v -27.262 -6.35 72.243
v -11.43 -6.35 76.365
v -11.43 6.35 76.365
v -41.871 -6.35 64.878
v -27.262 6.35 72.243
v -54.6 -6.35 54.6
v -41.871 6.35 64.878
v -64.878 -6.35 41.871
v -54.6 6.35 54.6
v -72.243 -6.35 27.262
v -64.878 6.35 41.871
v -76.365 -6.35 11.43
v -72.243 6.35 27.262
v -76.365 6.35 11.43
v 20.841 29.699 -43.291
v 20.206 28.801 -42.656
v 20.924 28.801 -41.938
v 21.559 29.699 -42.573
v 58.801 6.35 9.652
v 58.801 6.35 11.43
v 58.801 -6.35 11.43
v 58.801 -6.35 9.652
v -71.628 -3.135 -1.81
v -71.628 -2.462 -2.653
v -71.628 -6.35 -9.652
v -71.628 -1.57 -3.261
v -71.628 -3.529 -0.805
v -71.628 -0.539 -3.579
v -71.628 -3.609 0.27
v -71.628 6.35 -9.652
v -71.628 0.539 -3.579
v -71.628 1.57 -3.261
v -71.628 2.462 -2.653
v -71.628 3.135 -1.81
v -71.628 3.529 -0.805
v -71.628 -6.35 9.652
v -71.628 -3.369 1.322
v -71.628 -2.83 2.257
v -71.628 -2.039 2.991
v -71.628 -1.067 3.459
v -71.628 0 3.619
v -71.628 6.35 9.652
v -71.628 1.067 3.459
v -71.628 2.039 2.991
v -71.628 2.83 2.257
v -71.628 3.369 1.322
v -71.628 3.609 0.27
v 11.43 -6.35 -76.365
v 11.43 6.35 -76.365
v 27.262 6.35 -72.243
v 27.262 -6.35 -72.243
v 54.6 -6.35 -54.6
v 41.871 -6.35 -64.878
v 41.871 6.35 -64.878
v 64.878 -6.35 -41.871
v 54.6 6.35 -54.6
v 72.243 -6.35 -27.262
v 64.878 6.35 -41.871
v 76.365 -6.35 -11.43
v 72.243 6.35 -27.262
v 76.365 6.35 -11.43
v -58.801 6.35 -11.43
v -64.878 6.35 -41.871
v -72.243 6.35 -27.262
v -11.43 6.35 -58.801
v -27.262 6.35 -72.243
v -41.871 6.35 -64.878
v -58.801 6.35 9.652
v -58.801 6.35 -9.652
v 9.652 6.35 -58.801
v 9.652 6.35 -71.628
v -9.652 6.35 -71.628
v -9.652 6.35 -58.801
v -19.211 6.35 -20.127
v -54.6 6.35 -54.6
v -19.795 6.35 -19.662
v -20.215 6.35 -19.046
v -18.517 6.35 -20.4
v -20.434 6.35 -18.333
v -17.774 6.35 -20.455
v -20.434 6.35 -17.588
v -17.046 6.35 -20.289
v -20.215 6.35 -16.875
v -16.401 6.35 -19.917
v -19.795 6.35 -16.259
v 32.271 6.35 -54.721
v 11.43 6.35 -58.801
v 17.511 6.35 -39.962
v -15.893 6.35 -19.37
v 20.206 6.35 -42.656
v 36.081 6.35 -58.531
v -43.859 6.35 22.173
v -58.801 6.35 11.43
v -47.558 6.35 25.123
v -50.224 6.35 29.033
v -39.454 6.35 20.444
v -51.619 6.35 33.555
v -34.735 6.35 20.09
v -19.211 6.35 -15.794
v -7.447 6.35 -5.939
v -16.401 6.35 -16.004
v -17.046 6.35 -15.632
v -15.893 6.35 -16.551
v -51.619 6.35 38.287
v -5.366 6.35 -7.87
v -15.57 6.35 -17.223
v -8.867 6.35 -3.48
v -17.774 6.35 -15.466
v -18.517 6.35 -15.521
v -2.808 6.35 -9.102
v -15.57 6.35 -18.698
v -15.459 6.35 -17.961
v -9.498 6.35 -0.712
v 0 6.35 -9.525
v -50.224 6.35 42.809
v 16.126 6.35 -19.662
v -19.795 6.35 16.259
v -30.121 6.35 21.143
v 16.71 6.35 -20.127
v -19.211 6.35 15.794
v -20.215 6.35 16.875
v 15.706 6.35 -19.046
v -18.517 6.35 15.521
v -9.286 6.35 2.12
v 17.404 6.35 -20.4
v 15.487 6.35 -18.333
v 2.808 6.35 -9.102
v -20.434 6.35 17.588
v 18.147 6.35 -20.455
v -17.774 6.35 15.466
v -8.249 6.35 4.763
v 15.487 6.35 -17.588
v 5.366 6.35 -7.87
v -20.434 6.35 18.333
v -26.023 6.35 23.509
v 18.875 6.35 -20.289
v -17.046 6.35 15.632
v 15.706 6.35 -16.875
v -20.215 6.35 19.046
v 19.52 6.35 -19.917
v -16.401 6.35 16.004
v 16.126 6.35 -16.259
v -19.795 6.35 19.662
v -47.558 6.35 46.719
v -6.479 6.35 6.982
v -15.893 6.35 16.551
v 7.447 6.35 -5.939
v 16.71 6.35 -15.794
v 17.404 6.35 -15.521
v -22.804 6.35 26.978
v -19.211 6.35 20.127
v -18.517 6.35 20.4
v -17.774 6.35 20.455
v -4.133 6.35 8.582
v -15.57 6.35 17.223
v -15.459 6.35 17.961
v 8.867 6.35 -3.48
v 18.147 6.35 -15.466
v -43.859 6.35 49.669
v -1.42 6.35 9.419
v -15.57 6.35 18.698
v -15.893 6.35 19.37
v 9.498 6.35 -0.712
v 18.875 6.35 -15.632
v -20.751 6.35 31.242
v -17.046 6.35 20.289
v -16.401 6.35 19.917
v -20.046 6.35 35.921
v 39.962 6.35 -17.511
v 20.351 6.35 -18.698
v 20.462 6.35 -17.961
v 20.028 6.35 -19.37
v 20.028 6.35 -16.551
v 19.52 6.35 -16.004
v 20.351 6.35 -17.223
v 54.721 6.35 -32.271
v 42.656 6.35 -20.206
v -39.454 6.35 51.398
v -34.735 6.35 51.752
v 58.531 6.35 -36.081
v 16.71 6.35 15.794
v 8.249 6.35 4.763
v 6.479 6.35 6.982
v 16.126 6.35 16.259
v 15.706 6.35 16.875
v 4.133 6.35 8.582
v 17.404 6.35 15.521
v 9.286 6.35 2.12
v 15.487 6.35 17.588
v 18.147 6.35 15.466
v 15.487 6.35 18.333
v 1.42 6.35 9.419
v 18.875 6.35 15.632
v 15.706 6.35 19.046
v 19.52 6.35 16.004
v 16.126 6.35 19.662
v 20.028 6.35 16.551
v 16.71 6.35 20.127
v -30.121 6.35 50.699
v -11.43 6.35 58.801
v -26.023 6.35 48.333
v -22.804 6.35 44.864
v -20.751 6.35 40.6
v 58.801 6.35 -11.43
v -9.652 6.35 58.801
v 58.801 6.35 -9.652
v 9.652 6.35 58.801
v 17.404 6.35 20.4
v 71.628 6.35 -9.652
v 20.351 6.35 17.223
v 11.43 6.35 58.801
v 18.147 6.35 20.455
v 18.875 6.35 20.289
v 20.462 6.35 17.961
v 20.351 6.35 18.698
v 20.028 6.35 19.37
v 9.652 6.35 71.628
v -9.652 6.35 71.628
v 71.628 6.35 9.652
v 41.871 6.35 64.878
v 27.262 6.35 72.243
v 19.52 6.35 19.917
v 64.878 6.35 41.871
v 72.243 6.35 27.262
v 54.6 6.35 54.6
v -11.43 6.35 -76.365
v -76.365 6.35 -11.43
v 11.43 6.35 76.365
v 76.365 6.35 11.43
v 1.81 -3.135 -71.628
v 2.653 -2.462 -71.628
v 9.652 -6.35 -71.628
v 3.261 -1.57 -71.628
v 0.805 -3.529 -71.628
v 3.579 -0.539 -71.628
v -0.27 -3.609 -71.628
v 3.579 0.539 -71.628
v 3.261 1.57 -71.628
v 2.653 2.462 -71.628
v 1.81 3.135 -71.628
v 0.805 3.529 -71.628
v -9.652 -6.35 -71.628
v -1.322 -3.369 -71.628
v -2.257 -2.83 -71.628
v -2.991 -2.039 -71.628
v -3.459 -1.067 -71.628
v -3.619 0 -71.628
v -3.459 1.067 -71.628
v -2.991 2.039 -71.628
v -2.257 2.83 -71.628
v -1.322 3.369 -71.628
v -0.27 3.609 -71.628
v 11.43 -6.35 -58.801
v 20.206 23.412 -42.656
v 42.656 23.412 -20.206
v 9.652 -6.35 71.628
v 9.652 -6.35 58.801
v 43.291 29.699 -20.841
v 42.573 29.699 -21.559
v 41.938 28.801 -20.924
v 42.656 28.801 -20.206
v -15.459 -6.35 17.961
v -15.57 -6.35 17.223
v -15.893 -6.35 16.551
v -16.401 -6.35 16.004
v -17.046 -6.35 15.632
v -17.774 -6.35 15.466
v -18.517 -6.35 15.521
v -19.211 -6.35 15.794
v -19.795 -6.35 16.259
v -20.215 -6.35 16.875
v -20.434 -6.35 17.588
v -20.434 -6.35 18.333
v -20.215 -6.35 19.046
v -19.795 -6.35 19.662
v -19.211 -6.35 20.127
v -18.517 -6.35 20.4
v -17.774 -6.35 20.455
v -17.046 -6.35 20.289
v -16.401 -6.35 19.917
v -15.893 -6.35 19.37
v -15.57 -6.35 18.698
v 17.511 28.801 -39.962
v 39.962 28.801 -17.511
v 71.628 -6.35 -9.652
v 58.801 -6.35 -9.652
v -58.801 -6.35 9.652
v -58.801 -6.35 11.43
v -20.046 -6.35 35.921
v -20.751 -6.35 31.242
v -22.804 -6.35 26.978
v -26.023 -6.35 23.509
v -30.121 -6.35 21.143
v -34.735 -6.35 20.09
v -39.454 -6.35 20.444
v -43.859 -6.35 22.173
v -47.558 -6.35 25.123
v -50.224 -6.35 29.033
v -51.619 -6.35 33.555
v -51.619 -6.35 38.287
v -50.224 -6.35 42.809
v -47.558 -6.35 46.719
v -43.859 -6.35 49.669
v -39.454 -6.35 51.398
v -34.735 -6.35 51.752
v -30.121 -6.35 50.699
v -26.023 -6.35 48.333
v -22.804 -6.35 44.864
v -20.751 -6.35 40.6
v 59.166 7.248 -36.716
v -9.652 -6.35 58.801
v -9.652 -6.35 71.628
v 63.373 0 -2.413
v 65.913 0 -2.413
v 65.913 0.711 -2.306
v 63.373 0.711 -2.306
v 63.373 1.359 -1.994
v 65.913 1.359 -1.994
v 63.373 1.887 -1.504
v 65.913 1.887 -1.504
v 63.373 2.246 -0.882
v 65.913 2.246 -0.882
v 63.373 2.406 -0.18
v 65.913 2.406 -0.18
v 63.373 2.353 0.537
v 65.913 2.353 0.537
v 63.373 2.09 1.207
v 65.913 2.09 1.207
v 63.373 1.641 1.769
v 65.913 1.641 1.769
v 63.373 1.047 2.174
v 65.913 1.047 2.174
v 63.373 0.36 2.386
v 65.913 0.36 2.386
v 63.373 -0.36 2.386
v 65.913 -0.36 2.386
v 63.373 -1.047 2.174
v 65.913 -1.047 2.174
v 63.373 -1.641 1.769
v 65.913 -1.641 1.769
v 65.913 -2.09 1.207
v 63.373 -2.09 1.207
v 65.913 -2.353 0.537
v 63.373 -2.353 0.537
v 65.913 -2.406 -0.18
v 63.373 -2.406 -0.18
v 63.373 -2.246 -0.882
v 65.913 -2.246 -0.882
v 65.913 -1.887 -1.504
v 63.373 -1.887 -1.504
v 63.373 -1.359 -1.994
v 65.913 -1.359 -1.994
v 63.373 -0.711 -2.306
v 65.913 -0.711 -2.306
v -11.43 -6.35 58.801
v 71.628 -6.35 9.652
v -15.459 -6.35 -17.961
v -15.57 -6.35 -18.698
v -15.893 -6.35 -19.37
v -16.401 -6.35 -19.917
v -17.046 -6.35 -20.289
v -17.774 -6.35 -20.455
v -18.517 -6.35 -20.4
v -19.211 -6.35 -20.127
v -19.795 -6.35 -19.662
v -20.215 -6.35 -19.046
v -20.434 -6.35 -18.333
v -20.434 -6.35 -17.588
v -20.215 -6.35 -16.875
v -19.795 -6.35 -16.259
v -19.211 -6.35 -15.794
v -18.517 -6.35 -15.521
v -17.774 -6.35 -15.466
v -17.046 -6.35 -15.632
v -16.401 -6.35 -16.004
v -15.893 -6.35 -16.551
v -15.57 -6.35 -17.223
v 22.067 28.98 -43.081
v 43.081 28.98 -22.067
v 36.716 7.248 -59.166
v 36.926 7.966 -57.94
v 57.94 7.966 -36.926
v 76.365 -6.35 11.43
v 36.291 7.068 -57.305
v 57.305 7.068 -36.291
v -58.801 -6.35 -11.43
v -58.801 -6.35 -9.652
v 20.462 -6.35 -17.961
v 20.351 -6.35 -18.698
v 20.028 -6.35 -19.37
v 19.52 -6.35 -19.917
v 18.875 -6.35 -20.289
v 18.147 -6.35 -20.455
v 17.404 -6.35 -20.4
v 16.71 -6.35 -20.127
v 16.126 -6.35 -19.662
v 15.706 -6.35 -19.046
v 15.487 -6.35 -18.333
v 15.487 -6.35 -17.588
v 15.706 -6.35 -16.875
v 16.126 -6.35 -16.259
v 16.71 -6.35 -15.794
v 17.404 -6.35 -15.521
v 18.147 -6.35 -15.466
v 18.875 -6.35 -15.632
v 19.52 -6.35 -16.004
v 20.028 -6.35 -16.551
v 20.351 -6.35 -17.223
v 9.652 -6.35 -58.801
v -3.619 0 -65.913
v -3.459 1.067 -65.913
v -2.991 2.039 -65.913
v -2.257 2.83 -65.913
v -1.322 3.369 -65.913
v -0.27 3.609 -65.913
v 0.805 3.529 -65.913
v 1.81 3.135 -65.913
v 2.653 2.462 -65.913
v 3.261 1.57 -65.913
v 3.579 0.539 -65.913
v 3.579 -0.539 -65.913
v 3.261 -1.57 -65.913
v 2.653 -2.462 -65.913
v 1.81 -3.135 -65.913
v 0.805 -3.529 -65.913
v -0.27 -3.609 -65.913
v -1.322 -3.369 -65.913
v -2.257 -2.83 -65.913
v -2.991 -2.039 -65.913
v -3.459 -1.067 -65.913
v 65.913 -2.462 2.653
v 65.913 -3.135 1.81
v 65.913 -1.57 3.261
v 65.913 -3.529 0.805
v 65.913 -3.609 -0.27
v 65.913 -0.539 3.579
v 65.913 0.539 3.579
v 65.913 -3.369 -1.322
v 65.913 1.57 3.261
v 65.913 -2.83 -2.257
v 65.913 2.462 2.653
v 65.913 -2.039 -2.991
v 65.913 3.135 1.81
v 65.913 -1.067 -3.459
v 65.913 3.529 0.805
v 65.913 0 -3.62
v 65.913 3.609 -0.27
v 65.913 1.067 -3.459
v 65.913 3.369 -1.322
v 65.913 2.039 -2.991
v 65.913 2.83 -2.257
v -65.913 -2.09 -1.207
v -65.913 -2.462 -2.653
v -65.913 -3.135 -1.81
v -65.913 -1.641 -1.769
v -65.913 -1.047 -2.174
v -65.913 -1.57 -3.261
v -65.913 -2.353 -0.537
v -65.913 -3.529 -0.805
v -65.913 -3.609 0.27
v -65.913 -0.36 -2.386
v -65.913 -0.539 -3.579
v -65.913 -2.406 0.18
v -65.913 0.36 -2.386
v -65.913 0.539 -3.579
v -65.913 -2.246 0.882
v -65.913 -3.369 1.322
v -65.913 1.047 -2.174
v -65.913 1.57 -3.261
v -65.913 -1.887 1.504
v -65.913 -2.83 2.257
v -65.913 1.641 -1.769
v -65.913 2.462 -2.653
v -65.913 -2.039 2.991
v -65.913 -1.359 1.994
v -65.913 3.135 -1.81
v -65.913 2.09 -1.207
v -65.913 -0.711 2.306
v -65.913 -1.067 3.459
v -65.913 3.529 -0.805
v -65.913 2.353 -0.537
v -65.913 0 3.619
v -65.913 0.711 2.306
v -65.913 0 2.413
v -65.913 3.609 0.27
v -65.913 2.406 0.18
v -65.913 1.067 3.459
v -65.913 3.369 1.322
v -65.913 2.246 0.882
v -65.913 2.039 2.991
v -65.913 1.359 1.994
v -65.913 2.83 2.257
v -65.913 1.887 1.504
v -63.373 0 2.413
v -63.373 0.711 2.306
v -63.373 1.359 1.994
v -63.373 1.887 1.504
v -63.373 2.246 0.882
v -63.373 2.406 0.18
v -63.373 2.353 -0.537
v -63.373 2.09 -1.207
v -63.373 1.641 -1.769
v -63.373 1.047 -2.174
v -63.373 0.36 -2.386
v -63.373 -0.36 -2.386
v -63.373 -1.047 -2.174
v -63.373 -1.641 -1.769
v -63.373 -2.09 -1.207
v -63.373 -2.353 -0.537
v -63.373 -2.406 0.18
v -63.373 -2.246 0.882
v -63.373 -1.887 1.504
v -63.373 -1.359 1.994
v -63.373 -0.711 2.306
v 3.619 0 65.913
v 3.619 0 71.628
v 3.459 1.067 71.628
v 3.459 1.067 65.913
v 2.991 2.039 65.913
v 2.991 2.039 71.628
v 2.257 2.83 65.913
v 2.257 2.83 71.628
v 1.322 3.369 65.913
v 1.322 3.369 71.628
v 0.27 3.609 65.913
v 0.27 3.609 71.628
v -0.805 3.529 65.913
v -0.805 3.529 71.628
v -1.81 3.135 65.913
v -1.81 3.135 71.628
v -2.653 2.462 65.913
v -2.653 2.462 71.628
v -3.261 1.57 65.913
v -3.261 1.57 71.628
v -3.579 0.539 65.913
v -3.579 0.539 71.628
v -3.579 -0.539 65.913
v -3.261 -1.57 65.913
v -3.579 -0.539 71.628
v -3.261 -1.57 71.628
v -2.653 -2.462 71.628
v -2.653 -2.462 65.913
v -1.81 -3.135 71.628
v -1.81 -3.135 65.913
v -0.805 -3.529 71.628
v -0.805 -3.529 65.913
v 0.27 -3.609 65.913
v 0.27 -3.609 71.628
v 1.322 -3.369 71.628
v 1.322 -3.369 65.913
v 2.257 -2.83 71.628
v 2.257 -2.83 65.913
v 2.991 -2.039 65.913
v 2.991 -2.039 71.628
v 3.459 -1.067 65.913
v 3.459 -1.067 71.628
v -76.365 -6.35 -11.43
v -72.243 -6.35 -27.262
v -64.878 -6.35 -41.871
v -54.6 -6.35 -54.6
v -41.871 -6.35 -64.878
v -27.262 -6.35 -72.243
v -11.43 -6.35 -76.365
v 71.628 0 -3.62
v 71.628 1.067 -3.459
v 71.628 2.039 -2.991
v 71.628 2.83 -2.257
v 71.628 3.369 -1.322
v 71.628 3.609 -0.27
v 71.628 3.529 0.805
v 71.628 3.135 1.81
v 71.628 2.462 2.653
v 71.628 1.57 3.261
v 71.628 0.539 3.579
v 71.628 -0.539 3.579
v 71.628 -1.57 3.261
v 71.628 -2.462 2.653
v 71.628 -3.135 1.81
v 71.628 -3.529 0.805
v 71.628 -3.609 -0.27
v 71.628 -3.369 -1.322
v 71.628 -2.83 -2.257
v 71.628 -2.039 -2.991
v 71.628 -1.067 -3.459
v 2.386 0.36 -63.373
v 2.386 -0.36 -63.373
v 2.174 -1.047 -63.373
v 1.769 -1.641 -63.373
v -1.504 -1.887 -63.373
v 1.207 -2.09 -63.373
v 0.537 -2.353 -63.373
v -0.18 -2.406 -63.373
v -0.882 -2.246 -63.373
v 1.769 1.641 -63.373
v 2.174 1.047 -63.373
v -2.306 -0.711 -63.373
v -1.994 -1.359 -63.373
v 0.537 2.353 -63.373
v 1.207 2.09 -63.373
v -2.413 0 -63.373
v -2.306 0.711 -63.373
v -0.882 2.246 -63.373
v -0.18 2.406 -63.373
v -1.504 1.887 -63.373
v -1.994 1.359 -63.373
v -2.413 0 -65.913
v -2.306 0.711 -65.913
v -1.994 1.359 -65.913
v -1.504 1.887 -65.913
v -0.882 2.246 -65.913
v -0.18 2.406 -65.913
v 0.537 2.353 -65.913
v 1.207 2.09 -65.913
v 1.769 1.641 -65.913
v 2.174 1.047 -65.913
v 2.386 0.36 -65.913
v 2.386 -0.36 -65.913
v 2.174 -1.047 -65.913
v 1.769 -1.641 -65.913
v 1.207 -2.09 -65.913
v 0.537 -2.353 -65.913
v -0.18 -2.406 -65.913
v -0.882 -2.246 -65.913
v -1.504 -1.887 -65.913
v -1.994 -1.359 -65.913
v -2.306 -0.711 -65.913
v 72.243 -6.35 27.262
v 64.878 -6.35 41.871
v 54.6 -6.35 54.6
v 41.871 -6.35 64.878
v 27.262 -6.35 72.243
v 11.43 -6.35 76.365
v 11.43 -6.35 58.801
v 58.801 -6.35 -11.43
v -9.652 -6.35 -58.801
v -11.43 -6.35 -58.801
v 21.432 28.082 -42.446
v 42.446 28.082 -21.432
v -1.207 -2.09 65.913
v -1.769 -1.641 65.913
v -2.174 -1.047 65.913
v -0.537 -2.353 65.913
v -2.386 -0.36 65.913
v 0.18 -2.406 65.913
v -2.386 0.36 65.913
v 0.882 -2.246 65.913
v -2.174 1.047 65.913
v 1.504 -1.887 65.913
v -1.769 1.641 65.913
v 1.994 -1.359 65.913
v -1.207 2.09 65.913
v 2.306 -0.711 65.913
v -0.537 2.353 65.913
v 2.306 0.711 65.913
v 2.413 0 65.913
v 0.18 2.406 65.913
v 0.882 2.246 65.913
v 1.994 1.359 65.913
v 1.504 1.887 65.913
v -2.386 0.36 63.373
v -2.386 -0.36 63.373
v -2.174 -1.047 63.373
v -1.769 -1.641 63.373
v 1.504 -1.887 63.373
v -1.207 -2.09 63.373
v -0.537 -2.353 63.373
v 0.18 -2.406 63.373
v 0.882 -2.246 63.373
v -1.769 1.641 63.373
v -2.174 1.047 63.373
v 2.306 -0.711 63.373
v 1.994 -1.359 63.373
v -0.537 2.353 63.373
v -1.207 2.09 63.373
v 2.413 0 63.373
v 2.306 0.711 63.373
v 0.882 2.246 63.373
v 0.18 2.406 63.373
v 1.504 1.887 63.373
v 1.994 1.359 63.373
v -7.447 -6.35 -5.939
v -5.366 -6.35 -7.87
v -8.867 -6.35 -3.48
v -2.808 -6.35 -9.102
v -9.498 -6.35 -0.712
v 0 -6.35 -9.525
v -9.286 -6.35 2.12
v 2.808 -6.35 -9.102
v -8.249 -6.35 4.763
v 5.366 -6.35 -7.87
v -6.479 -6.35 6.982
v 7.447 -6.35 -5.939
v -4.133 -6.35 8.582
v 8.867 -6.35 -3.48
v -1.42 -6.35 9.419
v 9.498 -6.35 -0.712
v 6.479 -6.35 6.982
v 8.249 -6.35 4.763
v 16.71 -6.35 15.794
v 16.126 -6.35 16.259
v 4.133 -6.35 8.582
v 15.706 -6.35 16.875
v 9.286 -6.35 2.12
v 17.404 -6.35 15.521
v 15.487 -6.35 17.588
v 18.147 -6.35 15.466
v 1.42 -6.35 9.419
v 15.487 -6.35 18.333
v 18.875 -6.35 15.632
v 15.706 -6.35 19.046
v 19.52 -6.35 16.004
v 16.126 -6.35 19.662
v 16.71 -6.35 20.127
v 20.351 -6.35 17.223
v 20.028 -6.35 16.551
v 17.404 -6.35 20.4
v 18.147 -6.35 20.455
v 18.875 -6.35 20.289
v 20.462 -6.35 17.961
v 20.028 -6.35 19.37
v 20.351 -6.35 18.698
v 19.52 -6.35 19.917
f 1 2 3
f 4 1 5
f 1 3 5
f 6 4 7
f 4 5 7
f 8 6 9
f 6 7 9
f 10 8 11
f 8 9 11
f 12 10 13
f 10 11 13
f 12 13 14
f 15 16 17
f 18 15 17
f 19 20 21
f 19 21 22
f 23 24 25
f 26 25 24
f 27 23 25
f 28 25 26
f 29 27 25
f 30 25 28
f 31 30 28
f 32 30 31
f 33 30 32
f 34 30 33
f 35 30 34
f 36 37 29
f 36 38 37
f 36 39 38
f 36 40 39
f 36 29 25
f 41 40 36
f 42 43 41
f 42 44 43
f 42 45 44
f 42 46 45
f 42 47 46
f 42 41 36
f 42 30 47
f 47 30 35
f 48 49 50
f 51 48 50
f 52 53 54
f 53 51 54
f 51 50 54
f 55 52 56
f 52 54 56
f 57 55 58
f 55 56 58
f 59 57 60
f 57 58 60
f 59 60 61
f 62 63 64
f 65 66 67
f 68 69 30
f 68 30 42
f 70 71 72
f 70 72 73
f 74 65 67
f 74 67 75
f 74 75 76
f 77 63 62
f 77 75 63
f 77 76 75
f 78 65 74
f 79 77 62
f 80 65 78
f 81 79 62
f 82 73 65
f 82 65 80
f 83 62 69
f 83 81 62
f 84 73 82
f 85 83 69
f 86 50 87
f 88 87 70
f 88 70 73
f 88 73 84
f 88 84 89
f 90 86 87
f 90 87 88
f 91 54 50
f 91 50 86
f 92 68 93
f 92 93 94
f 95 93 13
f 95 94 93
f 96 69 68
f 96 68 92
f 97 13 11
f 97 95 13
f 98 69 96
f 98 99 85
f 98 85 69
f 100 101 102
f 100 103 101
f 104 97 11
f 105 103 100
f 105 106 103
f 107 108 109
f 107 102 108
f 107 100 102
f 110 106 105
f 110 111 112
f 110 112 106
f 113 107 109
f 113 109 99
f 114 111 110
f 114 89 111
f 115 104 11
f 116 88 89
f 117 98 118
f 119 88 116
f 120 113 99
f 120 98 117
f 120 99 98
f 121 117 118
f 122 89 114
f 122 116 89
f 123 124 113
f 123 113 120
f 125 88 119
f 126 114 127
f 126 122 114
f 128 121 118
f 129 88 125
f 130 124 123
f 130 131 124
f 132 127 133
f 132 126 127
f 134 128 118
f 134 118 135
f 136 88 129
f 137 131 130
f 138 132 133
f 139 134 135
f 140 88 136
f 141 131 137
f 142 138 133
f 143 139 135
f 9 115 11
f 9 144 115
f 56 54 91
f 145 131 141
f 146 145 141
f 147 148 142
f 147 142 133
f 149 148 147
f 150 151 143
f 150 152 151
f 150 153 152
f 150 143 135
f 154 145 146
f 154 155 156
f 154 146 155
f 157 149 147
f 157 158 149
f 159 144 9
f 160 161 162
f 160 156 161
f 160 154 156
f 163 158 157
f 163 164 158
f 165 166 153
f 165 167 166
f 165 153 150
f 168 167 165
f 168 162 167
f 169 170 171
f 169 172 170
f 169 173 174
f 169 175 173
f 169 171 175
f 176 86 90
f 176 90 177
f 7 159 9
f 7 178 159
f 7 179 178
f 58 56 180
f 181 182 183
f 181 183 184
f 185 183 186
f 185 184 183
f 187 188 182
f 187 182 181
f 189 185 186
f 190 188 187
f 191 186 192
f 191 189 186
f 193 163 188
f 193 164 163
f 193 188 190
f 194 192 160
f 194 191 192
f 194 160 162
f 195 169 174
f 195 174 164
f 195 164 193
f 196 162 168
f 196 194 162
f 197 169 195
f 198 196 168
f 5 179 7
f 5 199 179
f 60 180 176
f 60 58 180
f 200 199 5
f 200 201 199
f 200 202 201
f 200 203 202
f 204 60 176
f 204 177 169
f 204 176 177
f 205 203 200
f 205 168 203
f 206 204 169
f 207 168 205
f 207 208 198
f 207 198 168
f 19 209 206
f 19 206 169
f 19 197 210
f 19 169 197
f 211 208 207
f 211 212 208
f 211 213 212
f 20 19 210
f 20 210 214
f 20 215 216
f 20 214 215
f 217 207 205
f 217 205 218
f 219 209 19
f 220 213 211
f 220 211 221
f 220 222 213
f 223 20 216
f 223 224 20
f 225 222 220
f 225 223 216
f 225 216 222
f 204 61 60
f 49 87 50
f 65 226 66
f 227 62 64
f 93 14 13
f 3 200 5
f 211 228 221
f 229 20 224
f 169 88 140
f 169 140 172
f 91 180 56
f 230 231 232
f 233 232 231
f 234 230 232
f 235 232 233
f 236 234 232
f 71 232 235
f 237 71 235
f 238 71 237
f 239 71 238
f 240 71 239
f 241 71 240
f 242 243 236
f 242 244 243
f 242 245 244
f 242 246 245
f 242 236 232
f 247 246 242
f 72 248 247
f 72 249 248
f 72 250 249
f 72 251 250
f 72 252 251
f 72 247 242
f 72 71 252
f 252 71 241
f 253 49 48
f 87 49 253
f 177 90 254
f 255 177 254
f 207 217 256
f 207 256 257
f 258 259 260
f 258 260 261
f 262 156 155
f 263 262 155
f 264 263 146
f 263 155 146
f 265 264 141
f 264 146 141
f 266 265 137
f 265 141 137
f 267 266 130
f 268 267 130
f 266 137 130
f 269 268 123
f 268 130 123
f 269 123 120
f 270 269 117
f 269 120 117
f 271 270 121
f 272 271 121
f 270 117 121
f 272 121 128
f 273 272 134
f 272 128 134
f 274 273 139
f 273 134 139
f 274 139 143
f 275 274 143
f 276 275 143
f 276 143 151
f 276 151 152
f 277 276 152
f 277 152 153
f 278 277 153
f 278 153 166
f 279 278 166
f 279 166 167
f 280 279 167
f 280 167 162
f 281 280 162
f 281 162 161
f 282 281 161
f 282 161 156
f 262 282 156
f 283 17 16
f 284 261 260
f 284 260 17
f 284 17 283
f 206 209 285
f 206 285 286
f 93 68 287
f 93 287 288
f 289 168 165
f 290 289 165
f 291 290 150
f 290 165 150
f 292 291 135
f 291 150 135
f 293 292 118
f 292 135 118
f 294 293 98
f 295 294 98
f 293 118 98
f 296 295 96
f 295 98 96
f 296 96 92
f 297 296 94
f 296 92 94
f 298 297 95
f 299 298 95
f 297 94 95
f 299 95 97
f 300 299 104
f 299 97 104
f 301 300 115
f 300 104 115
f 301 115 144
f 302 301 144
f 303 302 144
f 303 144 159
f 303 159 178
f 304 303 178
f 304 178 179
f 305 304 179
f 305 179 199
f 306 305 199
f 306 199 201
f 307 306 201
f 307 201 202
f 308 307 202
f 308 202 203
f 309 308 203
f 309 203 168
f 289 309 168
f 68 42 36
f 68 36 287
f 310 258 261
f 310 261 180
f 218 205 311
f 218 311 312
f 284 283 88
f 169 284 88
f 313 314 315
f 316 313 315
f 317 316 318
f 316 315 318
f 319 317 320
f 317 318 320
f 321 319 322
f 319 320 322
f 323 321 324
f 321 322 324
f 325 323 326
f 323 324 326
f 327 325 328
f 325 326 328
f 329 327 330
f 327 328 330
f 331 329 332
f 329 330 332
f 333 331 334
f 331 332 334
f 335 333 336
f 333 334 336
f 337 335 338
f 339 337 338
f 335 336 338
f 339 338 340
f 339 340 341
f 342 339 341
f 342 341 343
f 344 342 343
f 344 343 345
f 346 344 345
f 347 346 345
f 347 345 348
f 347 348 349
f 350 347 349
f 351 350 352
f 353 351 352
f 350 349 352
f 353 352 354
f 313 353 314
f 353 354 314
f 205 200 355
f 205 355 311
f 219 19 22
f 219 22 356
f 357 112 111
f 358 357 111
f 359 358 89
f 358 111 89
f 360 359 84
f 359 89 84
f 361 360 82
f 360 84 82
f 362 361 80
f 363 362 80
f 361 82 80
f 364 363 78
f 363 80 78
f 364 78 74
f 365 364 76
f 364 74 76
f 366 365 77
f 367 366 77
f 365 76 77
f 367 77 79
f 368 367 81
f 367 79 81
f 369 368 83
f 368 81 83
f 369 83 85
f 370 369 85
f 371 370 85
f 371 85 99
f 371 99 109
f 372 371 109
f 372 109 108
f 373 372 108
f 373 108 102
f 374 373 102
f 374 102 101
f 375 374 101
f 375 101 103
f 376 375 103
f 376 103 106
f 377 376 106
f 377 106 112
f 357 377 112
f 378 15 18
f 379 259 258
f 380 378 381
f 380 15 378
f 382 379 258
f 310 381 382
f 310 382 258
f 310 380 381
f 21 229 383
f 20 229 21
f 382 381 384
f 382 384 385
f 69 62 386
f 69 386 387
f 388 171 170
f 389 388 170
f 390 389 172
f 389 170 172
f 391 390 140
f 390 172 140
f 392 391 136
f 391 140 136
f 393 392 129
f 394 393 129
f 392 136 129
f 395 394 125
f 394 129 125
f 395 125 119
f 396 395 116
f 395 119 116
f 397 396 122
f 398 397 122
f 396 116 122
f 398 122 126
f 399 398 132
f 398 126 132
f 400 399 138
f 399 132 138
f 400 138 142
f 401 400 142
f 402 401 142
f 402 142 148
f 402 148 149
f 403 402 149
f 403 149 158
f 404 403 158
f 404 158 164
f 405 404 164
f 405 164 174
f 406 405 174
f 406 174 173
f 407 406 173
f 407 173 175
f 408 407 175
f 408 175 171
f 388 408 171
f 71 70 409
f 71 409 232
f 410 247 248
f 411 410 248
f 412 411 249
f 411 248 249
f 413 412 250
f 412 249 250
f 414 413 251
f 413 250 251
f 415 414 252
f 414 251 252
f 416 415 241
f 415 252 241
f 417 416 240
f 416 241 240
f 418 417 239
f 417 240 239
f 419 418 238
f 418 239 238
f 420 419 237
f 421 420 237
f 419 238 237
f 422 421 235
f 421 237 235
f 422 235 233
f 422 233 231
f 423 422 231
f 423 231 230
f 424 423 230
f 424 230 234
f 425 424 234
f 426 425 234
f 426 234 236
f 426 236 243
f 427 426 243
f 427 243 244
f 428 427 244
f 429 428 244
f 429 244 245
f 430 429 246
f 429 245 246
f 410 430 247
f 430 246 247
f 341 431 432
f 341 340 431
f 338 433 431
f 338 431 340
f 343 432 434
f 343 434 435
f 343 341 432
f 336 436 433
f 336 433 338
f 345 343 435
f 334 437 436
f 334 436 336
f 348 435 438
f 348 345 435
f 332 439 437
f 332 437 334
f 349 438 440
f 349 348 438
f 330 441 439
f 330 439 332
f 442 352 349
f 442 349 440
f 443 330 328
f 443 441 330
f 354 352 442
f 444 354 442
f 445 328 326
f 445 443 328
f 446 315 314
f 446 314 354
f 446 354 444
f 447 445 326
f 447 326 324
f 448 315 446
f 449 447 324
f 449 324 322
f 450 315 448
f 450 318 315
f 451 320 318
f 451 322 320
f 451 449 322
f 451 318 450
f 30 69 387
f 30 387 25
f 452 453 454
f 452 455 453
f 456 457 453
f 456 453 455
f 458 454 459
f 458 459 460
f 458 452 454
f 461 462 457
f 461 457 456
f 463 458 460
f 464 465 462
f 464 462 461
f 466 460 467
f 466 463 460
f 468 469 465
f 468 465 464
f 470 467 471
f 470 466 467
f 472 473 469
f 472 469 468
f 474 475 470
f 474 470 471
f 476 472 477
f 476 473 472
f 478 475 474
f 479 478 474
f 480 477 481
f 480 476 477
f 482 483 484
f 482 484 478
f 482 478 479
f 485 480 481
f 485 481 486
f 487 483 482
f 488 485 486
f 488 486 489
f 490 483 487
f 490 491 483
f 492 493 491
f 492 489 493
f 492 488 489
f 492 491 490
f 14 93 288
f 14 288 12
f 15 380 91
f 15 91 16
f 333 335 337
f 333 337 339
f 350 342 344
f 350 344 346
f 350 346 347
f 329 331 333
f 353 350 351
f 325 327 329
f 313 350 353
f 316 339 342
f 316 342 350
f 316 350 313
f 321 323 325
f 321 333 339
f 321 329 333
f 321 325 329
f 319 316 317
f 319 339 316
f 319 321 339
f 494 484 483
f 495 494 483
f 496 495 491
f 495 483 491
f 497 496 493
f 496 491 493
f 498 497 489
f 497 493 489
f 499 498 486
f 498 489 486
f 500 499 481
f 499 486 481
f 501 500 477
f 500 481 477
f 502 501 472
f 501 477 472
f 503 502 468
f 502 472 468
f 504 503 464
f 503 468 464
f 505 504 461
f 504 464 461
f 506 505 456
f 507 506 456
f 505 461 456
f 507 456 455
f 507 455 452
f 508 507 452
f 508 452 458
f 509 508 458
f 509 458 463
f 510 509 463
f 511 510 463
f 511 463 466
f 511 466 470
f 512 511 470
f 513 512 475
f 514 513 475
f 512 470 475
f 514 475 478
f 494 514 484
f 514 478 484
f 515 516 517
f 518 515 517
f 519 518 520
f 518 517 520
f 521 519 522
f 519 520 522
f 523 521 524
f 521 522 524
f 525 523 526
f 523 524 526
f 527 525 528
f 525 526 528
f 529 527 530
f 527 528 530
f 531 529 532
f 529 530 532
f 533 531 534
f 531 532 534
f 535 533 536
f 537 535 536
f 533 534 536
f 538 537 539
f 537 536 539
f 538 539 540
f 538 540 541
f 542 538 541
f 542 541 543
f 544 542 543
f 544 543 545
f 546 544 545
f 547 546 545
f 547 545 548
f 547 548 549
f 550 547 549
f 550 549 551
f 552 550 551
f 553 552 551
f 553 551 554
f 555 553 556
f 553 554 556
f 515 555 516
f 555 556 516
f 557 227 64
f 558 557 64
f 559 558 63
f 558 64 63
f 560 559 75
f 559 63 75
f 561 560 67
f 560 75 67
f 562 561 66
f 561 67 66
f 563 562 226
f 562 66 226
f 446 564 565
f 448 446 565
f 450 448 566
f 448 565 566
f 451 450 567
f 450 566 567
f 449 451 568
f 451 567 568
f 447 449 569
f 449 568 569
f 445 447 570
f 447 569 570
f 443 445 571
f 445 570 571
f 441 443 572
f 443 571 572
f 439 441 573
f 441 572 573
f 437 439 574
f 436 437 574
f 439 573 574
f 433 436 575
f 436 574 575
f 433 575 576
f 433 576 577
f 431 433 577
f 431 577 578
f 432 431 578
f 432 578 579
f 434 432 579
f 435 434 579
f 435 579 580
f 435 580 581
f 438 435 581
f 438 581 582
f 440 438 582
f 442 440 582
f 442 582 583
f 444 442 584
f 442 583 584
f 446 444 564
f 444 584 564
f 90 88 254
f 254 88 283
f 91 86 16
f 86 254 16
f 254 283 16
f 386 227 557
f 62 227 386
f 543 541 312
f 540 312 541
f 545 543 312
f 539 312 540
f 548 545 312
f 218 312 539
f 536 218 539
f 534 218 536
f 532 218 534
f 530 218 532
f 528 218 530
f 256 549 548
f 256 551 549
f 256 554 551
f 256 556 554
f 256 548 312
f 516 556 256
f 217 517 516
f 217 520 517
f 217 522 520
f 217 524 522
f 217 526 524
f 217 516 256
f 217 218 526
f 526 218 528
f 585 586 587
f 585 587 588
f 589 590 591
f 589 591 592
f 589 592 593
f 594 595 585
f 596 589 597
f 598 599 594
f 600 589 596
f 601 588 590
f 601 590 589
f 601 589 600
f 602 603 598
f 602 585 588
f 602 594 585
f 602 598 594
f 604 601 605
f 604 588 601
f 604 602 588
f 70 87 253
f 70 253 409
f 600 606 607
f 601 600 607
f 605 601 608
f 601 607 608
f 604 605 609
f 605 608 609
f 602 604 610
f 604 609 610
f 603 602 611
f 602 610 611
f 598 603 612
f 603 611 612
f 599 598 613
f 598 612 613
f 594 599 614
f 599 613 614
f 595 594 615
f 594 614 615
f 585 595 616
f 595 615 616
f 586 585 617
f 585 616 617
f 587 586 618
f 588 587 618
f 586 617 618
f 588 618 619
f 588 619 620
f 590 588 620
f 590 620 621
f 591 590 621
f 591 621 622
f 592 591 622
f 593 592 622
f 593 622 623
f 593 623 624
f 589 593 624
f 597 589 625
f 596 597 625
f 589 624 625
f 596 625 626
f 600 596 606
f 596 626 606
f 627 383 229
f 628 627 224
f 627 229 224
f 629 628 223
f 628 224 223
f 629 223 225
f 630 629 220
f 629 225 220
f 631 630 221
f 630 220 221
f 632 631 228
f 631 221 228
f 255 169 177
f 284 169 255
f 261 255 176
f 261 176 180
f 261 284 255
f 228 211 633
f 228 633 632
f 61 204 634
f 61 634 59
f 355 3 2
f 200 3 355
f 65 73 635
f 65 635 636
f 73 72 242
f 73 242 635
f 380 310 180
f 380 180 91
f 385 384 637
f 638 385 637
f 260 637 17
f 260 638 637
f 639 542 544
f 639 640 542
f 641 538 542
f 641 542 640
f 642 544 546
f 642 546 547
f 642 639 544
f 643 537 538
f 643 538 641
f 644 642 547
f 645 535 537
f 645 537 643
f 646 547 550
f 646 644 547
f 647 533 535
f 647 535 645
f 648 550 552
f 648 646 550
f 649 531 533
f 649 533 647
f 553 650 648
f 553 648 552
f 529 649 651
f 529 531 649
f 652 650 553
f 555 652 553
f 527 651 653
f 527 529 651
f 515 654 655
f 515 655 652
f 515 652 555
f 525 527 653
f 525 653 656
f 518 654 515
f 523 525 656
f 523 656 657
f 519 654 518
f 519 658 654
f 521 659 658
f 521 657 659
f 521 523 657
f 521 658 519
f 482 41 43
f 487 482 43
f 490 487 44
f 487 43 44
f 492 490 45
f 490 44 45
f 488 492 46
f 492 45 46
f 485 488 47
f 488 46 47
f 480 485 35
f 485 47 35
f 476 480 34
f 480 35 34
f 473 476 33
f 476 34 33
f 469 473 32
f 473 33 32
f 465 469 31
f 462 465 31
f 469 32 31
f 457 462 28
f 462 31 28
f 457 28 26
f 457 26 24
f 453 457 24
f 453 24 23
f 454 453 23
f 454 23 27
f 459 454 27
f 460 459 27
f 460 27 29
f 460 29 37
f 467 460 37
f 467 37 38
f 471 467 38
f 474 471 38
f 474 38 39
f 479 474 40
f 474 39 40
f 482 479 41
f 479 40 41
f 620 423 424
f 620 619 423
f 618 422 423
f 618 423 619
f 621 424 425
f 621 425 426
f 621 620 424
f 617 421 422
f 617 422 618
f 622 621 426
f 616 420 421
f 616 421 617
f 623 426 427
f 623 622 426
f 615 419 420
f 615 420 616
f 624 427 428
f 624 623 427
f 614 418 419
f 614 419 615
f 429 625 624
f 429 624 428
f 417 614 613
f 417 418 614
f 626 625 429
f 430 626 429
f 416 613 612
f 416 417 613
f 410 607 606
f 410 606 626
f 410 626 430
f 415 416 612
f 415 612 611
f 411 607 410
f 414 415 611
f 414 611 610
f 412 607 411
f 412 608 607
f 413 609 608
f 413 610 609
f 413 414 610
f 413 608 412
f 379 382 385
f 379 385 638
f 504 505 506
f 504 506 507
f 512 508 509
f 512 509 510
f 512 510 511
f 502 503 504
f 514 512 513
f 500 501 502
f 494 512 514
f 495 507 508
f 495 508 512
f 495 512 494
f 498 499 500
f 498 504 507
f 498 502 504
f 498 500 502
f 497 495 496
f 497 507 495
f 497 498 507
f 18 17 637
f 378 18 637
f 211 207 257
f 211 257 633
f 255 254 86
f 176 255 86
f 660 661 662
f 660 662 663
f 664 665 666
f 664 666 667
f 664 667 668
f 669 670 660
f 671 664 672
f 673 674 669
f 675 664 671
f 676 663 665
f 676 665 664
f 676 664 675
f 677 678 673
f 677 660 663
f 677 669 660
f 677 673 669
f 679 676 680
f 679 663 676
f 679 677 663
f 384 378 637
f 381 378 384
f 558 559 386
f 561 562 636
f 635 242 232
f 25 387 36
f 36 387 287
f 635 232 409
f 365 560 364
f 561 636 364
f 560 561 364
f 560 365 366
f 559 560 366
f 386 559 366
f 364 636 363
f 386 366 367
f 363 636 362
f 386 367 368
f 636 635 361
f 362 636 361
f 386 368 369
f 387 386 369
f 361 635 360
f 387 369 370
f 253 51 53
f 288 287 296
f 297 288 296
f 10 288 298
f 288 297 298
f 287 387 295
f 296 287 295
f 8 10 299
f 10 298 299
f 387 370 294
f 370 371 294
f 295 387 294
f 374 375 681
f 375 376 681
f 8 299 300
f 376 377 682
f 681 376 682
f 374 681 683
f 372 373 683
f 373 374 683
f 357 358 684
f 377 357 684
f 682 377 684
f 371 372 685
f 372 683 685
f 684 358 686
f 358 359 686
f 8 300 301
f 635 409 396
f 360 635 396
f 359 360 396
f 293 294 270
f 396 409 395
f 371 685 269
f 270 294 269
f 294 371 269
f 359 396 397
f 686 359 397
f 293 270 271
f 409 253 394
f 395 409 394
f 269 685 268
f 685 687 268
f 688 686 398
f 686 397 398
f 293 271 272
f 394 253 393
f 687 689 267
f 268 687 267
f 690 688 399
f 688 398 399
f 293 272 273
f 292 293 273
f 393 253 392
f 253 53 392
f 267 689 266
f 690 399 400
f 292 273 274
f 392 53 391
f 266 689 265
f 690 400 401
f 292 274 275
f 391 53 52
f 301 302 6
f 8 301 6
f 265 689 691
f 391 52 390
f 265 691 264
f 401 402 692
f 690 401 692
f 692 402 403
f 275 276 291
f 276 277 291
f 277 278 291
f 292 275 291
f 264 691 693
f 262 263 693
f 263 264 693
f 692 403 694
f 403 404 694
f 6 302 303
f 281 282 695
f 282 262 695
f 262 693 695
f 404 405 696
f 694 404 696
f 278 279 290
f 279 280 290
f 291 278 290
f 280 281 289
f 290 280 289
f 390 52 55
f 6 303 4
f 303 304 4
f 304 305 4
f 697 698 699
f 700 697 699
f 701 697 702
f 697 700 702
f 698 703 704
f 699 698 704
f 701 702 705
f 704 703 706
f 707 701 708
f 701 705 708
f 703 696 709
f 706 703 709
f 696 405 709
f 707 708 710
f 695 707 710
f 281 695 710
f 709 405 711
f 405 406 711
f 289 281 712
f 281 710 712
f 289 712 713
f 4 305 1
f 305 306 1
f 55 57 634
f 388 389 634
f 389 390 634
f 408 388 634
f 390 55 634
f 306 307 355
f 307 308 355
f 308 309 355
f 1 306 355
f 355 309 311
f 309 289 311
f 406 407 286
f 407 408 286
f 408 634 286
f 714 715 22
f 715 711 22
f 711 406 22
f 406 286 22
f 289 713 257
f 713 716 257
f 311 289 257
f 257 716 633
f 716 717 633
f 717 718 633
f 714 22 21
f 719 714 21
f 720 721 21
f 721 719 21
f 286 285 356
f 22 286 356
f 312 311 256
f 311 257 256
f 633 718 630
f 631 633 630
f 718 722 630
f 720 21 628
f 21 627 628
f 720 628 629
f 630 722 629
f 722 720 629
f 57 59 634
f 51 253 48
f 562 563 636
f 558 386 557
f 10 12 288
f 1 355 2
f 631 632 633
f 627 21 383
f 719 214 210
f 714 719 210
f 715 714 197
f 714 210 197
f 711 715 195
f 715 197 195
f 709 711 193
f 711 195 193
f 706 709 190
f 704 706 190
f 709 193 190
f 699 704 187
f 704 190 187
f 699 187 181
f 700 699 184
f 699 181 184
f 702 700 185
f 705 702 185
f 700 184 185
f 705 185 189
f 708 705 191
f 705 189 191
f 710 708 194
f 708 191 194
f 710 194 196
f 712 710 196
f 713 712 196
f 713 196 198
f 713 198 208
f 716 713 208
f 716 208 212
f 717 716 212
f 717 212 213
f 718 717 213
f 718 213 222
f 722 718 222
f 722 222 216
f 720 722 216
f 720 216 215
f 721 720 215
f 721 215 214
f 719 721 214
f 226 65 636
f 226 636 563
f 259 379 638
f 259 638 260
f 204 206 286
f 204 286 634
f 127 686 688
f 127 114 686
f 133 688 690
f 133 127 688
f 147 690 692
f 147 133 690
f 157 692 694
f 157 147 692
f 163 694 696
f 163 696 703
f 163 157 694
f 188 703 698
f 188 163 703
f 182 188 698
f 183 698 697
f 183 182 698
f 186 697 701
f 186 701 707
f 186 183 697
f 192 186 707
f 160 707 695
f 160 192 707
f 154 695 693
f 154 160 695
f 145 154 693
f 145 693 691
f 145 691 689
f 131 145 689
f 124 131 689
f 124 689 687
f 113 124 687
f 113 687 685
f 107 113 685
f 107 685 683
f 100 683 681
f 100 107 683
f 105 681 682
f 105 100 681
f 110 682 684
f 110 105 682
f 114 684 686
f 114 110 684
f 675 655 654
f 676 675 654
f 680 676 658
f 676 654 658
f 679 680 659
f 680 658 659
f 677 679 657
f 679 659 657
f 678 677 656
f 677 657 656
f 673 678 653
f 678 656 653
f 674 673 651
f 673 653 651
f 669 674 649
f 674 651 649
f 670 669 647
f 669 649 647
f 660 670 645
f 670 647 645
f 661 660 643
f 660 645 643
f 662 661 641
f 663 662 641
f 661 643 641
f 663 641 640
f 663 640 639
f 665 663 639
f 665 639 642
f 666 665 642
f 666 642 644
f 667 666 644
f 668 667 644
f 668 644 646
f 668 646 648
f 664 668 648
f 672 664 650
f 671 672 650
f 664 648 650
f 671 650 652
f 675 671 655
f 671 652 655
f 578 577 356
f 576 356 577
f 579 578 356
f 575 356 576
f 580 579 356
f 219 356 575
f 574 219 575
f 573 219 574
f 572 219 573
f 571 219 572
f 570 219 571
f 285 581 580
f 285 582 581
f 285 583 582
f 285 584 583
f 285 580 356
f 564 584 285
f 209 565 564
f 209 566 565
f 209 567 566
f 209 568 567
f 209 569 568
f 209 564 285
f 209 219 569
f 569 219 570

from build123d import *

# Parameters (mm, degrees)
SKETCH2_W            = 67.691
SKETCH2_H            = 12.7
SKETCH3_R            = 2.5019
CUT_EXTRUDE1_DEPTH   = 13.7
LPATTERN1_COUNT      = 2
LPATTERN1_PITCH      = 35.921024484
LPATTERN1_COUNT_DIR2 = 2
LPATTERN1_PITCH_DIR2 = 35.921024484
SKETCH5_R            = 15.875
CUT_EXTRUDE2_DEPTH   = 13.7
BOSS_EXTRUDE1_DEPTH  = 15.875
BOSS_EXTRUDE2_DEPTH  = 1.27
CUT_EXTRUDE3_DEPTH   = 13.7
SKETCH13_R           = 4.8387
CUT_EXTRUDE4_DEPTH   = 3.81
SKETCH14_R           = 3.6195
CUT_EXTRUDE5_DEPTH   = 5.715
CUT_EXTRUDE6_DEPTH   = 13.7000001
SKETCH16_R           = 2.413
CUT_EXTRUDE7_DEPTH   = 2.54
CIRPATTERN2_COUNT    = 4


with BuildPart() as part:
    # Sketch2 → Revolve1 (revolve)
    with BuildSketch(Plane(origin=(0, 0, 0), x_dir=(0, 0, -1), z_dir=(1, 0, 0))):
        with Locations((43.3705, 0)):
            Rectangle(SKETCH2_W, SKETCH2_H)
    revolve(axis=Axis((0, 9.434285714, 0), (0, -1, 0)))

    # Sketch3 → Cut-Extrude1 (cut, through all)
    with BuildSketch(Plane(origin=(0, 6.35, 0), x_dir=(1, 0, 0), z_dir=(0, 1, 0))):
        with Locations((17.960512242, 17.960512242)):
            Circle(SKETCH3_R)
    cut_extrude1 = extrude(amount=-CUT_EXTRUDE1_DEPTH, mode=Mode.SUBTRACT)

    # LPattern1: Cut-Extrude1 2 × 2
    with Locations(*[(-j * LPATTERN1_PITCH_DIR2, 0, i * LPATTERN1_PITCH) for i in range(LPATTERN1_COUNT) for j in range(LPATTERN1_COUNT_DIR2) if (i, j) != (0, 0)]):
        add(cut_extrude1, mode=Mode.SUBTRACT)

    # Sketch5 → Cut-Extrude2 (cut, through all)
    with BuildSketch(Plane(origin=(0, 6.35, 0), x_dir=(1, 0, 0), z_dir=(0, 1, 0))):
        with Locations((-35.921024484, -35.921024484)):
            Circle(SKETCH5_R)
    extrude(amount=-CUT_EXTRUDE2_DEPTH, mode=Mode.SUBTRACT)

    # Sketch7 → Boss-Extrude1 (add, symmetric)
    with BuildSketch(Plane(origin=(0, 0, 0), x_dir=(0.707106781, 0, -0.707106781), z_dir=(0.707106781, 0, 0.707106781))):
        Polygon((66.900640303, 6.35), (44.45, 28.800640303), (40.64, 28.800640303), (40.64, 6.35), (44.45, 6.35), (44.45, 23.41248663), (61.51248663, 6.35), align=None)
    extrude(amount=BOSS_EXTRUDE1_DEPTH, both=True)

    # Sketch8 → Boss-Extrude2 (add, symmetric)
    with BuildSketch(Plane(origin=(25.898012242, 36.625320151, -25.898012242), x_dir=(0.866025404, -0.40824829, 0.288675135), z_dir=(0.5, 0.707106781, -0.5))):
        Polygon((37.681578612, 25.793492955), (11.757812168, 44.124364002), (-6.573058879, 18.200597557), (-5.743498353, 17.614009684), (-5.156910479, 18.44357021), (12.000784821, 42.708215602), (36.265430213, 25.550520302), (19.107734913, 1.28587491), (18.521147039, 0.456314384), (19.350707566, -0.130273489), align=None)
    extrude(amount=BOSS_EXTRUDE2_DEPTH, both=True)

    # Sketch12 → Cut-Extrude3 (cut, through all)
    with BuildSketch(Plane(origin=(0, 6.35, 0), x_dir=(1, 0, 0), z_dir=(0, 1, 0))):
        Polygon((73.406, -11.43), (58.801, -11.43), (58.801, -9.652), (71.628, -9.652), (71.628, 9.652), (58.801, 9.652), (58.801, 11.43), (73.406, 11.43), align=None)
    cut_extrude3 = extrude(amount=-CUT_EXTRUDE3_DEPTH, mode=Mode.SUBTRACT)

    # Sketch13 → Cut-Extrude4 (cut)
    with BuildSketch(Plane(origin=(77.216, 0, 0), x_dir=(0, 0, -1), z_dir=(1, 0, 0))):
        Circle(SKETCH13_R)
    cut_extrude4 = extrude(amount=-CUT_EXTRUDE4_DEPTH, mode=Mode.SUBTRACT)

    # Sketch14 → Cut-Extrude5 (cut)
    with BuildSketch(Plane(origin=(71.628, 0, 0), x_dir=(0, 0, -1), z_dir=(1, 0, 0))):
        Circle(SKETCH14_R)
    cut_extrude5 = extrude(amount=-CUT_EXTRUDE5_DEPTH, mode=Mode.SUBTRACT)

    # Sketch15 → Cut-Extrude6 (cut, through all)
    with BuildSketch(Plane(origin=(0, 6.35, 0), x_dir=(1, 0, 0), z_dir=(0, 1, 0))):
        with BuildLine():
            Line((73.406, 11.43), (76.365343946, 11.43))
            ThreePointArc((76.365343946, 11.43), (77.216, 0), (76.365343946, -11.43))
            Line((76.365343946, -11.43), (73.406, -11.43))
            Line((73.406, -11.43), (73.406, 11.43))
        make_face()
    cut_extrude6 = extrude(amount=-CUT_EXTRUDE6_DEPTH, mode=Mode.SUBTRACT)

    # Sketch16 → Cut-Extrude7 (cut)
    with BuildSketch(Plane(origin=(65.913, 0, 0), x_dir=(0, 0, -1), z_dir=(1, 0, 0))):
        Circle(SKETCH16_R)
    cut_extrude7 = extrude(amount=-CUT_EXTRUDE7_DEPTH, mode=Mode.SUBTRACT)

    # CirPattern2: Cut-Extrude3, Cut-Extrude4, Cut-Extrude5, Cut-Extrude6, Cut-Extrude7 ×4 about axis
    cirpattern2_axis = Axis((0, 0, 0), (0, 1, 0))
    for i in range(1, CIRPATTERN2_COUNT):
        add(cut_extrude3.rotate(cirpattern2_axis, i * 360 / CIRPATTERN2_COUNT), mode=Mode.SUBTRACT)
        add(cut_extrude4.rotate(cirpattern2_axis, i * 360 / CIRPATTERN2_COUNT), mode=Mode.SUBTRACT)
        add(cut_extrude5.rotate(cirpattern2_axis, i * 360 / CIRPATTERN2_COUNT), mode=Mode.SUBTRACT)
        add(cut_extrude6.rotate(cirpattern2_axis, i * 360 / CIRPATTERN2_COUNT), mode=Mode.SUBTRACT)
        add(cut_extrude7.rotate(cirpattern2_axis, i * 360 / CIRPATTERN2_COUNT), mode=Mode.SUBTRACT)


solid = part.part
